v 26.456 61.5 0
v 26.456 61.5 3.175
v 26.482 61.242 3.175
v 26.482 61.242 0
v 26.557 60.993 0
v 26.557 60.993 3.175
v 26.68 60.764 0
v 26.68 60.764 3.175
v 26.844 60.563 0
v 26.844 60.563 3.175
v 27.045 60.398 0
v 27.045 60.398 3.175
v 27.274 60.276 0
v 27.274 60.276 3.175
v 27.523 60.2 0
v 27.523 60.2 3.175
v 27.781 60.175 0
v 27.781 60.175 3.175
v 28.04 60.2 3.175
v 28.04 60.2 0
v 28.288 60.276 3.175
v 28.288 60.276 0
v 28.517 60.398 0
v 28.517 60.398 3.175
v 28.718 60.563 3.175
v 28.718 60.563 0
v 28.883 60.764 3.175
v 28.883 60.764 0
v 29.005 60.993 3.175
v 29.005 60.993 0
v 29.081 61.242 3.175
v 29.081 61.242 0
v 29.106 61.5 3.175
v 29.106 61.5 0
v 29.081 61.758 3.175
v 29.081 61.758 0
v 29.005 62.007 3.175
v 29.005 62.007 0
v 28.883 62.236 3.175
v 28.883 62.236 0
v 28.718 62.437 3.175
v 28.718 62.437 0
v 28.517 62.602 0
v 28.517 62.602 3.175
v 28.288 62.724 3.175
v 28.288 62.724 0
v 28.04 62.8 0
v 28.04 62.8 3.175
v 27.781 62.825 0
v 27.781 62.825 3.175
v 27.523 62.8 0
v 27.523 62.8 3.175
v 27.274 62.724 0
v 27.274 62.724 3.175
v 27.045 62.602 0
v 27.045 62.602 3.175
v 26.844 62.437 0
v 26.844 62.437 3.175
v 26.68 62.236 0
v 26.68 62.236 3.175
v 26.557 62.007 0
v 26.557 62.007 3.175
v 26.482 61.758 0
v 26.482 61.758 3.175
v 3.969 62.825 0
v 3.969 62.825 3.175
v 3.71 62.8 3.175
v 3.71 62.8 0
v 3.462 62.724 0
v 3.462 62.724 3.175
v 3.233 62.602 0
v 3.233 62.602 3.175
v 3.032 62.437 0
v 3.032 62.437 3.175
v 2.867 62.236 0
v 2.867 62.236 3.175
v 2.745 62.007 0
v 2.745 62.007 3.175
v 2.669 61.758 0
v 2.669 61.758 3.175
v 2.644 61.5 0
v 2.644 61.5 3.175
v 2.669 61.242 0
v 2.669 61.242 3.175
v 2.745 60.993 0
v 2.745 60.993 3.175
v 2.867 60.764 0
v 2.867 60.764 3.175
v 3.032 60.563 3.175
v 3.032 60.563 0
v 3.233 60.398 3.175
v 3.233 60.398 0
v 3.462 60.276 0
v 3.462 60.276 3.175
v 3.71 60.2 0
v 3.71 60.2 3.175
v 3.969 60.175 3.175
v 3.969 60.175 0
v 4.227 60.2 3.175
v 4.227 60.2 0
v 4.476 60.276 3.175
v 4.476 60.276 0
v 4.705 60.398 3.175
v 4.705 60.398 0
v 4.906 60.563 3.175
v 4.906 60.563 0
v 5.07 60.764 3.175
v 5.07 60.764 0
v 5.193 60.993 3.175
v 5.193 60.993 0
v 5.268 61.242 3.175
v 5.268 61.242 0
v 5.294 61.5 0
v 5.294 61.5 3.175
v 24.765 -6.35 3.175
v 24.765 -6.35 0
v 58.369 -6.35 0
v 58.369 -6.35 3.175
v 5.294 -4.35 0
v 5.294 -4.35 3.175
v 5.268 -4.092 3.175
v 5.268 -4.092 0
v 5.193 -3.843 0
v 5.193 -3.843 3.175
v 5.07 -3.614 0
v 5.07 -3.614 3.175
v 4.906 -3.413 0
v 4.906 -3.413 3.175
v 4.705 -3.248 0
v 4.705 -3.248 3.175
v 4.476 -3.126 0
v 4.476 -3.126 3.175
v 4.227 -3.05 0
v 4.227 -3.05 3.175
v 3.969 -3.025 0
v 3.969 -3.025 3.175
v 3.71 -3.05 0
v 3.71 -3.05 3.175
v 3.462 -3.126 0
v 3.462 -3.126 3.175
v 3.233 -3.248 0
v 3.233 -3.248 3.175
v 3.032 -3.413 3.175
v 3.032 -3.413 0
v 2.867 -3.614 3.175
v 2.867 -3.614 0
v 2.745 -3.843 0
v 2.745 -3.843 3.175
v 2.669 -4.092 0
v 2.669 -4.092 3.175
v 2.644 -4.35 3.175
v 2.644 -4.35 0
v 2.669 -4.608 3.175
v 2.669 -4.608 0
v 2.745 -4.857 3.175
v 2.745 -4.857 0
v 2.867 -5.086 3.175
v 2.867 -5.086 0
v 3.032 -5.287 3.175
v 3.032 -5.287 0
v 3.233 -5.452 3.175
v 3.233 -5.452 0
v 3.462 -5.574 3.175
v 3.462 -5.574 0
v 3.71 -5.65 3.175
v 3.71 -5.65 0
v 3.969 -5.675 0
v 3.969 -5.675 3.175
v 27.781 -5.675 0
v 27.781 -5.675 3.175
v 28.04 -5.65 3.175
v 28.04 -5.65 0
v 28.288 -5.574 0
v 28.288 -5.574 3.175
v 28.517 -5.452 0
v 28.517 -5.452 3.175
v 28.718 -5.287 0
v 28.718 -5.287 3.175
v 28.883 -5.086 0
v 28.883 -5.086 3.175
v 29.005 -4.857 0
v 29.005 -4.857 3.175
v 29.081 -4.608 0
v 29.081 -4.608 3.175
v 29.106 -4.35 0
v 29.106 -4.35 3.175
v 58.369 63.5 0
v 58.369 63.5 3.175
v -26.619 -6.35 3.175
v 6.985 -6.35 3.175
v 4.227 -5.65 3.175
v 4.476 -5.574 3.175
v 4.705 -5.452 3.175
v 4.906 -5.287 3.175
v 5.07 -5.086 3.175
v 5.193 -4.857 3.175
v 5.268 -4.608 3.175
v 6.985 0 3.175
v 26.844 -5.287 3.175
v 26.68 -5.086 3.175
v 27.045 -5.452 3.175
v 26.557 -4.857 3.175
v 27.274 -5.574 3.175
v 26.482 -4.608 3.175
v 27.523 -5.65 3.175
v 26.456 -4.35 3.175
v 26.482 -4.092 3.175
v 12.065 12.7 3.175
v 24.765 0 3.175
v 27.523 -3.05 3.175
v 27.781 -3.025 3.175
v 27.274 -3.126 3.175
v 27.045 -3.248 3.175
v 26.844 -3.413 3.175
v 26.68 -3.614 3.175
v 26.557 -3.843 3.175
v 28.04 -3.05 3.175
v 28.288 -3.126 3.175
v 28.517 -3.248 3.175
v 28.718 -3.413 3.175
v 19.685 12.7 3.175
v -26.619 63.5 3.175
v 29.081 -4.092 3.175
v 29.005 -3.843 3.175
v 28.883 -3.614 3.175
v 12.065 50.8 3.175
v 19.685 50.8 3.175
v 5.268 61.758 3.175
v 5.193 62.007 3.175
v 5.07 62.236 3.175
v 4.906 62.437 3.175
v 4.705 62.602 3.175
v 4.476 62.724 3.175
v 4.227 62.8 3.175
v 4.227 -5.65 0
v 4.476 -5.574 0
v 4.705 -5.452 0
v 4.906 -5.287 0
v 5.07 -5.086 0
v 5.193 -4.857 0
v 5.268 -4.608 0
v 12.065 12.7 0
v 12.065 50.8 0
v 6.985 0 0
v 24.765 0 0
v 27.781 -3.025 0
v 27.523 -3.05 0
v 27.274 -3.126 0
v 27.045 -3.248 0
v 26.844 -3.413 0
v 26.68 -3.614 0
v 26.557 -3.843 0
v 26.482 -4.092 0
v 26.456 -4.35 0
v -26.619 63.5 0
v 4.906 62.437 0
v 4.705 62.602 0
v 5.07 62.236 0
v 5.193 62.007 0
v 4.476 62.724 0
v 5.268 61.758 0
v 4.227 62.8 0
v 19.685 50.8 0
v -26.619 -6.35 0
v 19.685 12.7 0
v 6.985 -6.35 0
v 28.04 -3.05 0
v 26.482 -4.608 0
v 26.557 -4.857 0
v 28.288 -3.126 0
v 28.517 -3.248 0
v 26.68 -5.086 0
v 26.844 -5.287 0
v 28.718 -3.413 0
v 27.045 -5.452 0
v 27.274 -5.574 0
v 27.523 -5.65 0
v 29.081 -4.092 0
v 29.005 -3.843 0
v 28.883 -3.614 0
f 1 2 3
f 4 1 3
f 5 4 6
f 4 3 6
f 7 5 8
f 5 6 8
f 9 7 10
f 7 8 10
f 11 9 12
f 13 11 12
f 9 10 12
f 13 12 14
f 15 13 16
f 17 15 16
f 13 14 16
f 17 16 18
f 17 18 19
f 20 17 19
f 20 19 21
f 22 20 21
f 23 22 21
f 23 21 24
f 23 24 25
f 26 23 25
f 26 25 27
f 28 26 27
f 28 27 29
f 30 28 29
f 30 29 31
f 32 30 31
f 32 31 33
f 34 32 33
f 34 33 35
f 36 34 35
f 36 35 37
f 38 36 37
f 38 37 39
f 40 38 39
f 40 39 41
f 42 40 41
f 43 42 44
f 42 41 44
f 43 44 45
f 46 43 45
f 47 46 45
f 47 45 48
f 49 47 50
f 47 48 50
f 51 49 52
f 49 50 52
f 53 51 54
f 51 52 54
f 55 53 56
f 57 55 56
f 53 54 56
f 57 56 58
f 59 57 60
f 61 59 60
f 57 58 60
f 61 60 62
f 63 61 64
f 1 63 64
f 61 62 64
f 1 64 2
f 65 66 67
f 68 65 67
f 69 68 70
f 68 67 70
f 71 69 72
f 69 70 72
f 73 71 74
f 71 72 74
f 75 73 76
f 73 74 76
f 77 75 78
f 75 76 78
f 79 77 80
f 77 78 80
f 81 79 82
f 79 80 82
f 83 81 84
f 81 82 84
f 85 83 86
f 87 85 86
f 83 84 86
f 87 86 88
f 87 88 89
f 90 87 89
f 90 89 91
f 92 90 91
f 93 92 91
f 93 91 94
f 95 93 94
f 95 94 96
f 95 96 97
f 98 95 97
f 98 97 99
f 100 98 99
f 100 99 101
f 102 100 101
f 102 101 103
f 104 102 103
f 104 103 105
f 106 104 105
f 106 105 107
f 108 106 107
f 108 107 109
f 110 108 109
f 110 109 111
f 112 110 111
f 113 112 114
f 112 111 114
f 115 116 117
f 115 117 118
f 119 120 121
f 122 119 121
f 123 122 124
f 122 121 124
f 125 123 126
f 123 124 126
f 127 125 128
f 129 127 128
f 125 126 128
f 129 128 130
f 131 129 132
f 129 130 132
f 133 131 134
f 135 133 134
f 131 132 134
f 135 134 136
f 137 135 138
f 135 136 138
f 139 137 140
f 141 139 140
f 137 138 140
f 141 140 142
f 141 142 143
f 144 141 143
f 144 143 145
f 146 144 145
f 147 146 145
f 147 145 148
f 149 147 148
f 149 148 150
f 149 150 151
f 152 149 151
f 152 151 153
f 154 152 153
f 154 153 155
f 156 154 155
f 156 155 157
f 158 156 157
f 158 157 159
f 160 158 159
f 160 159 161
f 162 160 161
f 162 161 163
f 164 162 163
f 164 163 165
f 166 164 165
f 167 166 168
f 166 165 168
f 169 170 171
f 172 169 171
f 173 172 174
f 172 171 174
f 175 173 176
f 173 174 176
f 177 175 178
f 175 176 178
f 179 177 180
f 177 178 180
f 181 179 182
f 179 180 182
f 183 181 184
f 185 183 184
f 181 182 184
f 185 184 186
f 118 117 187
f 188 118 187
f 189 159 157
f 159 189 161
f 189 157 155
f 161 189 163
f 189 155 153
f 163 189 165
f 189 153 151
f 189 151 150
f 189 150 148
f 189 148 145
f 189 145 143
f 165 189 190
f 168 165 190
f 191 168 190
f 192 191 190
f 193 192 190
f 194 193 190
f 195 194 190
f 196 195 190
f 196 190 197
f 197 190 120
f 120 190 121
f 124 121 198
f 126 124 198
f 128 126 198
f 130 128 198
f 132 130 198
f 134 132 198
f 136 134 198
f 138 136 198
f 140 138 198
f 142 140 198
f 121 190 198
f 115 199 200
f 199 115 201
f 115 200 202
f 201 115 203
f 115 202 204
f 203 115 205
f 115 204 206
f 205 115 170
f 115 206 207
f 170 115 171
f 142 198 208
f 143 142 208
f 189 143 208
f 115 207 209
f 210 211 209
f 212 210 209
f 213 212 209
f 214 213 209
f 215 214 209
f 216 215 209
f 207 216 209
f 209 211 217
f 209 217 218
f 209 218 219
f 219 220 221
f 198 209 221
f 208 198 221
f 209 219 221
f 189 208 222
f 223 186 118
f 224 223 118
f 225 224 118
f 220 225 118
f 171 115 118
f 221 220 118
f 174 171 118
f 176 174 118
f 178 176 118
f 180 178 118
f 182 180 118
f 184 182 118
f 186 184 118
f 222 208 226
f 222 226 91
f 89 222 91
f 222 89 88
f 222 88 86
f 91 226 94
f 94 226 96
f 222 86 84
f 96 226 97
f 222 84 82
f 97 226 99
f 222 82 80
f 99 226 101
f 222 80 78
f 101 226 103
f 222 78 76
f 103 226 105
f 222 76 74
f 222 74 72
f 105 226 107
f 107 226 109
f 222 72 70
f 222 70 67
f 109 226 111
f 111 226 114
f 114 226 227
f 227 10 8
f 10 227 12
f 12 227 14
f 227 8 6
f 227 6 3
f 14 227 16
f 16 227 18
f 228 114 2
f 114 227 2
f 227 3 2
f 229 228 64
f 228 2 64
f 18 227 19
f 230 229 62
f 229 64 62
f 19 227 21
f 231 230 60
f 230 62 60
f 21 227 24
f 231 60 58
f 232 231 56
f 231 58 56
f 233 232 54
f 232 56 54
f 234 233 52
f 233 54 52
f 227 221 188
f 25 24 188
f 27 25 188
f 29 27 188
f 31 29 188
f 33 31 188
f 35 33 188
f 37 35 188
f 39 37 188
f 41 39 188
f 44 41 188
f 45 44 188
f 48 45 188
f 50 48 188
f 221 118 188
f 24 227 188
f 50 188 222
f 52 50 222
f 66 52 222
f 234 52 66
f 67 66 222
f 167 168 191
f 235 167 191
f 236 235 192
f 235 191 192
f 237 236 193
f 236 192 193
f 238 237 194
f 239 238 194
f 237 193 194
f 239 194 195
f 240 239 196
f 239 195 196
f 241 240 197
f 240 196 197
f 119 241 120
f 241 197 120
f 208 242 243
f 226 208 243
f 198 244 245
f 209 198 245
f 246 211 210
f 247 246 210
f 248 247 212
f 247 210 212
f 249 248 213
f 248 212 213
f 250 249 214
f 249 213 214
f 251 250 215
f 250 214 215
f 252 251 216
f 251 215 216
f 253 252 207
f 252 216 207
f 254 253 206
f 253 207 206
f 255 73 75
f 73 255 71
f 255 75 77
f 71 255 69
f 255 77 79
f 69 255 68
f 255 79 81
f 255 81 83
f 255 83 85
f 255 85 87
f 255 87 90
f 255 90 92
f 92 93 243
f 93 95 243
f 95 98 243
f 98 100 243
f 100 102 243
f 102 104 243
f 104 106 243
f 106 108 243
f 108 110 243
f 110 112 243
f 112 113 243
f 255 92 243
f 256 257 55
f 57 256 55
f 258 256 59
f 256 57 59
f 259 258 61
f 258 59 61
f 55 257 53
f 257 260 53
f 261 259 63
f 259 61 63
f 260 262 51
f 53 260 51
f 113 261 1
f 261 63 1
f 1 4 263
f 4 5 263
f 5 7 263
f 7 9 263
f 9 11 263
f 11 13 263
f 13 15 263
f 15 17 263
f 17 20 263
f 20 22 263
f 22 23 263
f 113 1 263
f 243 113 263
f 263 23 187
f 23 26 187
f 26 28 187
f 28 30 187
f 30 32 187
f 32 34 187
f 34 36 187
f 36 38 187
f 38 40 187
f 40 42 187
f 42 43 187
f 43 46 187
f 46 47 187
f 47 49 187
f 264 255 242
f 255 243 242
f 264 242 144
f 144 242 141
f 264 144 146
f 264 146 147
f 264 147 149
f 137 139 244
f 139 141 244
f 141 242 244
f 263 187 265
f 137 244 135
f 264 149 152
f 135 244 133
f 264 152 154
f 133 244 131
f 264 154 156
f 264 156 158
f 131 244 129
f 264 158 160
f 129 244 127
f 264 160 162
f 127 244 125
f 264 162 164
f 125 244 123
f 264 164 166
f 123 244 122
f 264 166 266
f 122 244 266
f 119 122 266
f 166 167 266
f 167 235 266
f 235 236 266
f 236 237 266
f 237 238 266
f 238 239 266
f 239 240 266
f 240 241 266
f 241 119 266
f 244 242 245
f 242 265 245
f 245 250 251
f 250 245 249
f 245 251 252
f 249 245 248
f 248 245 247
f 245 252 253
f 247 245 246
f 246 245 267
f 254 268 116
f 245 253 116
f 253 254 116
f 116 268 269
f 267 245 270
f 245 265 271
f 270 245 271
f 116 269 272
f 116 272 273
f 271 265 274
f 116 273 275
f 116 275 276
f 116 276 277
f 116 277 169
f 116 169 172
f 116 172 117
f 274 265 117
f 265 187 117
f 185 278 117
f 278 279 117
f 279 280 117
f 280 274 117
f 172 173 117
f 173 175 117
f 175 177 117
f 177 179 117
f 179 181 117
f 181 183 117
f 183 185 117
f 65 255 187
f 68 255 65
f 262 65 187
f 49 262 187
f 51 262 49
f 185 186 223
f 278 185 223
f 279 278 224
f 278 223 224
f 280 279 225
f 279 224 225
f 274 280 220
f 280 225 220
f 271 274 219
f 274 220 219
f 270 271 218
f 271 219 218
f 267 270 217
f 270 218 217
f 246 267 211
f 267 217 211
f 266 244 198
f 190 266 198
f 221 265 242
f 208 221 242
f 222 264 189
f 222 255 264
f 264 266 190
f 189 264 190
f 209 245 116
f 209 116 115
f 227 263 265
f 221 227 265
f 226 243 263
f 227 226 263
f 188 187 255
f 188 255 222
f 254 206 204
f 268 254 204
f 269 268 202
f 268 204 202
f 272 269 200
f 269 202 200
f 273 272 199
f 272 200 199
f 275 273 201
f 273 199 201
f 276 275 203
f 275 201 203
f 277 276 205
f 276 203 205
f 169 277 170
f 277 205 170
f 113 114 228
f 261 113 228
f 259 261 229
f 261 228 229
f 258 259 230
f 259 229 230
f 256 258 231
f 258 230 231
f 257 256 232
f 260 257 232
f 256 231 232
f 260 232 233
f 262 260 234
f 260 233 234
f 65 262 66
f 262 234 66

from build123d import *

# Parameters (mm, degrees)
F1_DEPTH = 3.175
F2_W     = 6.985
F2_H     = 3.175
F3_DEPTH = 6.35
F5_DEPTH = 25.4
F6_DEPTH = 25.4
F7_DEPTH = 26.6192
F8_DEPTH = 26.6192


# Not quite as in the source:
# - a feature names something its author has since deleted; it is built from what else it names


with BuildPart() as f1:
    # F0 (on Top) → F1 (new body)
    with BuildSketch(Plane.XY):
        Polygon((0, 63.5), (0, 0), (15.875, 0), (15.875, 12.7), (12.065, 12.7), (12.065, 50.8), (15.875, 50.8), (15.875, 63.5), align=None)
        Polygon((15.875, 12.7), (15.875, 0), (31.75, 0), (31.75, 63.5), (15.875, 63.5), (15.875, 50.8), (19.685, 50.8), (19.685, 12.7), align=None)
    extrude(amount=F1_DEPTH)

    # F2 (on face) → F3 (join)
    with BuildSketch(Plane.XZ):
        with Locations((3.4925, 1.5875)):
            Rectangle(F2_W, F2_H)
        with Locations((28.2575, 1.5875)):
            Rectangle(F2_W, F2_H)
    extrude(amount=F3_DEPTH)

    # F4 (on face) → F5 (cut)
    with BuildSketch(Plane.XY.offset(3.175)):
        with BuildLine():
            ThreePointArc((5.29375, -4.35), (3.0318335149, -3.4130835149), (3.96875, -5.675))
            Line((3.96875, -5.675), (3.96875, -4.35))
            Line((3.96875, -4.35), (5.29375, -4.35))
        make_face()
        with BuildLine():
            Line((3.96875, -4.35), (3.96875, -5.675))
            ThreePointArc((3.96875, -5.675), (4.9056664851, -5.2869164851), (5.29375, -4.35))
            Line((5.29375, -4.35), (3.96875, -4.35))
        make_face()
        with BuildLine():
            ThreePointArc((27.78125, -3.025), (26.8443335149, -3.4130835149), (26.45625, -4.35))
            Line((26.45625, -4.35), (27.78125, -4.35))
            Line((27.78125, -4.35), (27.78125, -3.025))
        make_face()
    extrude(amount=-F5_DEPTH, mode=Mode.SUBTRACT)

    # F4 (on face) → F6 (cut)
    with BuildSketch(Plane.XY.offset(3.175)):
        with BuildLine():
            ThreePointArc((29.10625, 61.5), (27.78125, 62.825), (26.45625, 61.5))
            ThreePointArc((26.45625, 61.5), (27.78125, 60.175), (29.10625, 61.5))
        make_face()
        with BuildLine():
            ThreePointArc((5.29375, 61.5), (4.9056664851, 62.4369164851), (3.96875, 62.825))
            ThreePointArc((3.96875, 62.825), (3.0318335149, 60.5630835149), (5.29375, 61.5))
        make_face()
        with BuildLine():
            Line((27.78125, -4.35), (26.45625, -4.35))
            ThreePointArc((26.45625, -4.35), (26.8443335149, -5.2869164851), (27.78125, -5.675))
            ThreePointArc((27.78125, -5.675), (28.7181664851, -5.2869164851), (29.10625, -4.35))
            ThreePointArc((29.10625, -4.35), (28.7181664851, -3.4130835149), (27.78125, -3.025))
            Line((27.78125, -3.025), (27.78125, -4.35))
        make_face()
    extrude(amount=-F6_DEPTH, mode=Mode.SUBTRACT)

    # F7 (add): a face of the model
    f7_faces = [f1.faces().sort_by_distance(p)[0] for p in [
        (31.75, 28.575, 1.5875),
    ]]
    extrude(f7_faces, amount=F7_DEPTH)

    # F8 (add): a face of the model
    f8_faces = [f1.faces().sort_by_distance(p)[0] for p in [
        (0, 28.575, 1.5875),
    ]]
    extrude(f8_faces, amount=F8_DEPTH)


solid = f1.part
